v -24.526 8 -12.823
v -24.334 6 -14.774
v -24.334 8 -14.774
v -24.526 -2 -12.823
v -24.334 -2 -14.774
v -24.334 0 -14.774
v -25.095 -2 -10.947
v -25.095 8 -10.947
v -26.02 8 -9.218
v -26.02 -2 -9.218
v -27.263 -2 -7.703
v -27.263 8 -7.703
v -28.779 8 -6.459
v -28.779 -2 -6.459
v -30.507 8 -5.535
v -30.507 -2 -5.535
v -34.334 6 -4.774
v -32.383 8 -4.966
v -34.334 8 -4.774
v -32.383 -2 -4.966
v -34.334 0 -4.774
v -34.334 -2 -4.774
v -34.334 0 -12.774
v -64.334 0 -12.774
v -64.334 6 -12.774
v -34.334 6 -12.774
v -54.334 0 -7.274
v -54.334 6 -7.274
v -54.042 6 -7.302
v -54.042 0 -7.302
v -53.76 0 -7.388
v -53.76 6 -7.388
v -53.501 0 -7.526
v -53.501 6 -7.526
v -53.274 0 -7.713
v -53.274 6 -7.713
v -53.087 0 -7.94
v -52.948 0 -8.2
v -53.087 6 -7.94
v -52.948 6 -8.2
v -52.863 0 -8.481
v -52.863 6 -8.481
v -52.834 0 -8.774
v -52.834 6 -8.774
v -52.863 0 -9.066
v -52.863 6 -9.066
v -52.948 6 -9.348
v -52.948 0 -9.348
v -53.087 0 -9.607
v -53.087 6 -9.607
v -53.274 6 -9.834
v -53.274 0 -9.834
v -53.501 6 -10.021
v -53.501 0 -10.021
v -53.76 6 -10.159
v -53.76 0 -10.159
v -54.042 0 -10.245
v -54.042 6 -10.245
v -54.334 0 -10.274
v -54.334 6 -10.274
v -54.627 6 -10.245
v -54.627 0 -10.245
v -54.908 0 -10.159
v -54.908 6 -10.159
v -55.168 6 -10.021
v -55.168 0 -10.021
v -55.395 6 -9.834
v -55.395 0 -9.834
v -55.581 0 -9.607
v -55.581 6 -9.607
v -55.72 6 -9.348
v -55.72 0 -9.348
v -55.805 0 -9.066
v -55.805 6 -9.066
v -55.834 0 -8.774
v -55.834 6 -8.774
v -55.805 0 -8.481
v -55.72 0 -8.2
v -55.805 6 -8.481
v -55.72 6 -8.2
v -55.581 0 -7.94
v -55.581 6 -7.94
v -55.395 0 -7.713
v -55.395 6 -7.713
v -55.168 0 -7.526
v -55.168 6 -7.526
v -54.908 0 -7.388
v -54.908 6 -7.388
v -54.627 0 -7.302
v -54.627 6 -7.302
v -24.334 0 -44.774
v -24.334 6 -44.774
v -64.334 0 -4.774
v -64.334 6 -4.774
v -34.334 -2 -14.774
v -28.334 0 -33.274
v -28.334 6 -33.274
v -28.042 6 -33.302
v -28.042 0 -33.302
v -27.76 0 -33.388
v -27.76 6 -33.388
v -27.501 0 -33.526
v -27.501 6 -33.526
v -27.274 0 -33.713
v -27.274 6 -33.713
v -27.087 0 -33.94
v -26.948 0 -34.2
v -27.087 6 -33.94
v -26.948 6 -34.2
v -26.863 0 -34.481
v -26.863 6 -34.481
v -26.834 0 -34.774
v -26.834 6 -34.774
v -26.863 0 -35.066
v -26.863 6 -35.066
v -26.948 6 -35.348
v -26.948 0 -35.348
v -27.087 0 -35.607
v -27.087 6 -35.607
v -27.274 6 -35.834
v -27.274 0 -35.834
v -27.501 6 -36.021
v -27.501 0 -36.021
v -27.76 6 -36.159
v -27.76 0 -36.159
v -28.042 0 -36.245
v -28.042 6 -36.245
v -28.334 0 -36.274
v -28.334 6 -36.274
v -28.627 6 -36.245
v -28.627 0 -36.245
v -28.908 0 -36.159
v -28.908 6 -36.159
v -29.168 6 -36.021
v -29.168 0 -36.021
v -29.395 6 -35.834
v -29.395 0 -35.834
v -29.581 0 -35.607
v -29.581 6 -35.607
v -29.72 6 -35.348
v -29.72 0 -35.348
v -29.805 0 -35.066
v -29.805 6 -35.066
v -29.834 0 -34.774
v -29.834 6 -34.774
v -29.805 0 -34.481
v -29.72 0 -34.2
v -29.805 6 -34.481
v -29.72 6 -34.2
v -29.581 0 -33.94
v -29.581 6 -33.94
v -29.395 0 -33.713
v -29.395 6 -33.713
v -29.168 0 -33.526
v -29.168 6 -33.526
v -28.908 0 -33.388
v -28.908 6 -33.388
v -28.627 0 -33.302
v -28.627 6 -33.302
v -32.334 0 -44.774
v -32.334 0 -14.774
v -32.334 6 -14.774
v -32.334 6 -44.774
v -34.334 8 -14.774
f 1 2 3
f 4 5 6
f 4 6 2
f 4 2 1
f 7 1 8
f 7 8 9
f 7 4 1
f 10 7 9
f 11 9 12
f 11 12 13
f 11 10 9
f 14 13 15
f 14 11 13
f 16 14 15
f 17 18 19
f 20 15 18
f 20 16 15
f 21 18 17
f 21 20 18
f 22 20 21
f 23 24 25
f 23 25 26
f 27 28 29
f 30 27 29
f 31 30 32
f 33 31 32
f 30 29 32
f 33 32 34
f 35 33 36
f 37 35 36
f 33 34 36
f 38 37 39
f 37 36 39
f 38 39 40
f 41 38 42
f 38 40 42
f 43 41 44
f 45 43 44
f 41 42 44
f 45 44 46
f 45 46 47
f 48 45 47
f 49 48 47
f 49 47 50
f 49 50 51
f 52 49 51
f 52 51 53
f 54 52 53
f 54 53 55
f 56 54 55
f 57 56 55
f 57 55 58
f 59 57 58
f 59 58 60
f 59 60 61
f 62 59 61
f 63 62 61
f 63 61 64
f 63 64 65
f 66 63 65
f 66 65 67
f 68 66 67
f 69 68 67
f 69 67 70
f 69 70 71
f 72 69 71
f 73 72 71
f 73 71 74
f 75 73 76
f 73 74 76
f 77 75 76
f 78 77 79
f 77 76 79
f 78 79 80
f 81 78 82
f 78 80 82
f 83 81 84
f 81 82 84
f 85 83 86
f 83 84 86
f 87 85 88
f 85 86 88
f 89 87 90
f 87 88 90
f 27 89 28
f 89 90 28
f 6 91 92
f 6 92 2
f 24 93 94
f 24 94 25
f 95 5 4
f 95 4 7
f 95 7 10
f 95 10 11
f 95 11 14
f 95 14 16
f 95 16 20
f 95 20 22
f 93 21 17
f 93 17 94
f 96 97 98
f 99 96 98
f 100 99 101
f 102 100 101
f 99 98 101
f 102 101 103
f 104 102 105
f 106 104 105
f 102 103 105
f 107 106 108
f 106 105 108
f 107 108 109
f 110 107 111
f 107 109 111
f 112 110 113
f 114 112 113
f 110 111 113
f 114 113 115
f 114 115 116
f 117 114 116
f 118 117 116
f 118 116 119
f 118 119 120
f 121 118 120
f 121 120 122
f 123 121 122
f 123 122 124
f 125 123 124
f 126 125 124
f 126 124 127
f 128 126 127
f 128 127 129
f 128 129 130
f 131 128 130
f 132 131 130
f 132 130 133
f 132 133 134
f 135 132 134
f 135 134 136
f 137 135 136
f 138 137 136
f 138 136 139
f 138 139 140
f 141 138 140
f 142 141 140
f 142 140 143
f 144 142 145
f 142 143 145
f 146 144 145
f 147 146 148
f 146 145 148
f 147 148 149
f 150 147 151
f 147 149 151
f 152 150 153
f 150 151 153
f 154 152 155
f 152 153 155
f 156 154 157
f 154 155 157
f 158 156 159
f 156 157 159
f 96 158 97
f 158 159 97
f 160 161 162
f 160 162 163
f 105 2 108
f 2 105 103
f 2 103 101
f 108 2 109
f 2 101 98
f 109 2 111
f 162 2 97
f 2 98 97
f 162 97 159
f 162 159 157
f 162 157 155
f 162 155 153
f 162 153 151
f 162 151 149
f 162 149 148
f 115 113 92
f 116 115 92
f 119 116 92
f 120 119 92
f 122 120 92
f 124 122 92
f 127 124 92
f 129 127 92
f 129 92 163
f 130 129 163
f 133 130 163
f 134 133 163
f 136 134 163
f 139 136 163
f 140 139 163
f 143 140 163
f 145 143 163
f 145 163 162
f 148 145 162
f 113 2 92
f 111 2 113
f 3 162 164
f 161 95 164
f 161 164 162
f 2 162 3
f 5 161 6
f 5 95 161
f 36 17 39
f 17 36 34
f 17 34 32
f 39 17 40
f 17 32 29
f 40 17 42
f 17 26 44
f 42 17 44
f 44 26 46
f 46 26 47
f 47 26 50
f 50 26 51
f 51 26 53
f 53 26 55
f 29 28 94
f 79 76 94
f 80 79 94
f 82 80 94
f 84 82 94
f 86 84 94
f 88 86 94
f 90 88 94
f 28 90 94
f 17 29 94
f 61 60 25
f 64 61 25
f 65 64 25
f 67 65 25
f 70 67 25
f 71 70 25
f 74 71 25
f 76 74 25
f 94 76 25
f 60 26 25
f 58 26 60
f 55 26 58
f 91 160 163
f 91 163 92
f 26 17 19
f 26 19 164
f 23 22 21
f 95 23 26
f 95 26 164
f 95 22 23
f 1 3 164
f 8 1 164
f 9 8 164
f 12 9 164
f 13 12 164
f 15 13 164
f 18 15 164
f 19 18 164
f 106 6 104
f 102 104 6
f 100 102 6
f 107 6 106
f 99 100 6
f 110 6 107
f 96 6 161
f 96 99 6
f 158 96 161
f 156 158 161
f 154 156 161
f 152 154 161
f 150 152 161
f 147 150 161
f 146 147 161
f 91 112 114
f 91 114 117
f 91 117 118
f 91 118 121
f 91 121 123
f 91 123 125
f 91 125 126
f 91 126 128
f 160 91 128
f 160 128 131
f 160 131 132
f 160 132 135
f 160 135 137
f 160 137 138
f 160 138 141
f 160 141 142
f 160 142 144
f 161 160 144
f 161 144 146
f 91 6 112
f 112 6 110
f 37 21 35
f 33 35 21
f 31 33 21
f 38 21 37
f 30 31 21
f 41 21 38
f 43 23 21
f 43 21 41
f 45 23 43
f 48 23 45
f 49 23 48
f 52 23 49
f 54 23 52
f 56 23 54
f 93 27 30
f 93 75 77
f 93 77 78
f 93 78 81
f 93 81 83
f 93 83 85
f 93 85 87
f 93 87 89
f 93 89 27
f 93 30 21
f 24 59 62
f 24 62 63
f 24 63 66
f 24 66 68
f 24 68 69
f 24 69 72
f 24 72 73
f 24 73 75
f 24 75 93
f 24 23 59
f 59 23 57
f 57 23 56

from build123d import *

# Parameters (mm, degrees)
EXTRUDE_5_DEPTH      = 6
EXTRUDE_7_DEPTH      = 2
EXTRUDE_7_DEPTH_BACK = 8
SKETCH_7_R           = 1.5
CUT_EXTRUDE_1_DEPTH  = 10


with BuildPart() as part:
    # 草图5 → 凸台-拉伸5 (new body)
    with BuildSketch(Plane(origin=(0, 0, 0), x_dir=(1, 0, 0), z_dir=(0, 1, 0))):
        with BuildLine():
            Line((-34.334210338, 14.7736082), (-32.334210338, 14.7736082))
            Line((-32.334210338, 14.7736082), (-32.334210338, 44.7736082))
            Line((-32.334210338, 44.7736082), (-24.334210338, 44.7736082))
            Line((-24.334210338, 44.7736082), (-24.334210338, 14.7736082))
            ThreePointArc((-24.334210338, 14.7736082), (-27.263142526, 7.702540389), (-34.334210338, 4.7736082))
            Line((-34.334210338, 4.7736082), (-64.334210338, 4.7736082))
            Line((-64.334210338, 4.7736082), (-64.334210338, 12.7736082))
            Line((-64.334210338, 12.7736082), (-34.334210338, 12.7736082))
            Line((-34.334210338, 12.7736082), (-34.334210338, 14.7736082))
        make_face()
    extrude(amount=EXTRUDE_5_DEPTH)

    # 草图6 → 凸台-拉伸7 (add, two sides: drawn at the far end of the back side and taken through both)
    with BuildSketch(Plane(origin=(0, 6, 0), x_dir=(1, 0, 0), z_dir=(0, 1, 0)).offset(-EXTRUDE_7_DEPTH_BACK)):
        with BuildLine():
            Line((-34.334210338, 14.7736082), (-24.334210338, 14.7736082))
            ThreePointArc((-24.334210338, 14.7736082), (-27.263142526, 7.702540389), (-34.334210338, 4.7736082))
            Line((-34.334210338, 4.7736082), (-34.334210338, 14.7736082))
        make_face()
    extrude(amount=EXTRUDE_7_DEPTH + EXTRUDE_7_DEPTH_BACK)

    # 草图7 → 切除-拉伸1 (cut)
    with BuildSketch(Plane(origin=(0, 6, 0), x_dir=(1, 0, 0), z_dir=(0, 1, 0))):
        with Locations(Location((-54.334210338, 8.7736082, 0), (0, 0, 270))):
            Circle(SKETCH_7_R)
        with Locations(Location((-28.334210338, 34.7736082, 0), (0, 0, 270))):
            Circle(SKETCH_7_R)
    extrude(amount=-CUT_EXTRUDE_1_DEPTH, mode=Mode.SUBTRACT)


solid = part.part
